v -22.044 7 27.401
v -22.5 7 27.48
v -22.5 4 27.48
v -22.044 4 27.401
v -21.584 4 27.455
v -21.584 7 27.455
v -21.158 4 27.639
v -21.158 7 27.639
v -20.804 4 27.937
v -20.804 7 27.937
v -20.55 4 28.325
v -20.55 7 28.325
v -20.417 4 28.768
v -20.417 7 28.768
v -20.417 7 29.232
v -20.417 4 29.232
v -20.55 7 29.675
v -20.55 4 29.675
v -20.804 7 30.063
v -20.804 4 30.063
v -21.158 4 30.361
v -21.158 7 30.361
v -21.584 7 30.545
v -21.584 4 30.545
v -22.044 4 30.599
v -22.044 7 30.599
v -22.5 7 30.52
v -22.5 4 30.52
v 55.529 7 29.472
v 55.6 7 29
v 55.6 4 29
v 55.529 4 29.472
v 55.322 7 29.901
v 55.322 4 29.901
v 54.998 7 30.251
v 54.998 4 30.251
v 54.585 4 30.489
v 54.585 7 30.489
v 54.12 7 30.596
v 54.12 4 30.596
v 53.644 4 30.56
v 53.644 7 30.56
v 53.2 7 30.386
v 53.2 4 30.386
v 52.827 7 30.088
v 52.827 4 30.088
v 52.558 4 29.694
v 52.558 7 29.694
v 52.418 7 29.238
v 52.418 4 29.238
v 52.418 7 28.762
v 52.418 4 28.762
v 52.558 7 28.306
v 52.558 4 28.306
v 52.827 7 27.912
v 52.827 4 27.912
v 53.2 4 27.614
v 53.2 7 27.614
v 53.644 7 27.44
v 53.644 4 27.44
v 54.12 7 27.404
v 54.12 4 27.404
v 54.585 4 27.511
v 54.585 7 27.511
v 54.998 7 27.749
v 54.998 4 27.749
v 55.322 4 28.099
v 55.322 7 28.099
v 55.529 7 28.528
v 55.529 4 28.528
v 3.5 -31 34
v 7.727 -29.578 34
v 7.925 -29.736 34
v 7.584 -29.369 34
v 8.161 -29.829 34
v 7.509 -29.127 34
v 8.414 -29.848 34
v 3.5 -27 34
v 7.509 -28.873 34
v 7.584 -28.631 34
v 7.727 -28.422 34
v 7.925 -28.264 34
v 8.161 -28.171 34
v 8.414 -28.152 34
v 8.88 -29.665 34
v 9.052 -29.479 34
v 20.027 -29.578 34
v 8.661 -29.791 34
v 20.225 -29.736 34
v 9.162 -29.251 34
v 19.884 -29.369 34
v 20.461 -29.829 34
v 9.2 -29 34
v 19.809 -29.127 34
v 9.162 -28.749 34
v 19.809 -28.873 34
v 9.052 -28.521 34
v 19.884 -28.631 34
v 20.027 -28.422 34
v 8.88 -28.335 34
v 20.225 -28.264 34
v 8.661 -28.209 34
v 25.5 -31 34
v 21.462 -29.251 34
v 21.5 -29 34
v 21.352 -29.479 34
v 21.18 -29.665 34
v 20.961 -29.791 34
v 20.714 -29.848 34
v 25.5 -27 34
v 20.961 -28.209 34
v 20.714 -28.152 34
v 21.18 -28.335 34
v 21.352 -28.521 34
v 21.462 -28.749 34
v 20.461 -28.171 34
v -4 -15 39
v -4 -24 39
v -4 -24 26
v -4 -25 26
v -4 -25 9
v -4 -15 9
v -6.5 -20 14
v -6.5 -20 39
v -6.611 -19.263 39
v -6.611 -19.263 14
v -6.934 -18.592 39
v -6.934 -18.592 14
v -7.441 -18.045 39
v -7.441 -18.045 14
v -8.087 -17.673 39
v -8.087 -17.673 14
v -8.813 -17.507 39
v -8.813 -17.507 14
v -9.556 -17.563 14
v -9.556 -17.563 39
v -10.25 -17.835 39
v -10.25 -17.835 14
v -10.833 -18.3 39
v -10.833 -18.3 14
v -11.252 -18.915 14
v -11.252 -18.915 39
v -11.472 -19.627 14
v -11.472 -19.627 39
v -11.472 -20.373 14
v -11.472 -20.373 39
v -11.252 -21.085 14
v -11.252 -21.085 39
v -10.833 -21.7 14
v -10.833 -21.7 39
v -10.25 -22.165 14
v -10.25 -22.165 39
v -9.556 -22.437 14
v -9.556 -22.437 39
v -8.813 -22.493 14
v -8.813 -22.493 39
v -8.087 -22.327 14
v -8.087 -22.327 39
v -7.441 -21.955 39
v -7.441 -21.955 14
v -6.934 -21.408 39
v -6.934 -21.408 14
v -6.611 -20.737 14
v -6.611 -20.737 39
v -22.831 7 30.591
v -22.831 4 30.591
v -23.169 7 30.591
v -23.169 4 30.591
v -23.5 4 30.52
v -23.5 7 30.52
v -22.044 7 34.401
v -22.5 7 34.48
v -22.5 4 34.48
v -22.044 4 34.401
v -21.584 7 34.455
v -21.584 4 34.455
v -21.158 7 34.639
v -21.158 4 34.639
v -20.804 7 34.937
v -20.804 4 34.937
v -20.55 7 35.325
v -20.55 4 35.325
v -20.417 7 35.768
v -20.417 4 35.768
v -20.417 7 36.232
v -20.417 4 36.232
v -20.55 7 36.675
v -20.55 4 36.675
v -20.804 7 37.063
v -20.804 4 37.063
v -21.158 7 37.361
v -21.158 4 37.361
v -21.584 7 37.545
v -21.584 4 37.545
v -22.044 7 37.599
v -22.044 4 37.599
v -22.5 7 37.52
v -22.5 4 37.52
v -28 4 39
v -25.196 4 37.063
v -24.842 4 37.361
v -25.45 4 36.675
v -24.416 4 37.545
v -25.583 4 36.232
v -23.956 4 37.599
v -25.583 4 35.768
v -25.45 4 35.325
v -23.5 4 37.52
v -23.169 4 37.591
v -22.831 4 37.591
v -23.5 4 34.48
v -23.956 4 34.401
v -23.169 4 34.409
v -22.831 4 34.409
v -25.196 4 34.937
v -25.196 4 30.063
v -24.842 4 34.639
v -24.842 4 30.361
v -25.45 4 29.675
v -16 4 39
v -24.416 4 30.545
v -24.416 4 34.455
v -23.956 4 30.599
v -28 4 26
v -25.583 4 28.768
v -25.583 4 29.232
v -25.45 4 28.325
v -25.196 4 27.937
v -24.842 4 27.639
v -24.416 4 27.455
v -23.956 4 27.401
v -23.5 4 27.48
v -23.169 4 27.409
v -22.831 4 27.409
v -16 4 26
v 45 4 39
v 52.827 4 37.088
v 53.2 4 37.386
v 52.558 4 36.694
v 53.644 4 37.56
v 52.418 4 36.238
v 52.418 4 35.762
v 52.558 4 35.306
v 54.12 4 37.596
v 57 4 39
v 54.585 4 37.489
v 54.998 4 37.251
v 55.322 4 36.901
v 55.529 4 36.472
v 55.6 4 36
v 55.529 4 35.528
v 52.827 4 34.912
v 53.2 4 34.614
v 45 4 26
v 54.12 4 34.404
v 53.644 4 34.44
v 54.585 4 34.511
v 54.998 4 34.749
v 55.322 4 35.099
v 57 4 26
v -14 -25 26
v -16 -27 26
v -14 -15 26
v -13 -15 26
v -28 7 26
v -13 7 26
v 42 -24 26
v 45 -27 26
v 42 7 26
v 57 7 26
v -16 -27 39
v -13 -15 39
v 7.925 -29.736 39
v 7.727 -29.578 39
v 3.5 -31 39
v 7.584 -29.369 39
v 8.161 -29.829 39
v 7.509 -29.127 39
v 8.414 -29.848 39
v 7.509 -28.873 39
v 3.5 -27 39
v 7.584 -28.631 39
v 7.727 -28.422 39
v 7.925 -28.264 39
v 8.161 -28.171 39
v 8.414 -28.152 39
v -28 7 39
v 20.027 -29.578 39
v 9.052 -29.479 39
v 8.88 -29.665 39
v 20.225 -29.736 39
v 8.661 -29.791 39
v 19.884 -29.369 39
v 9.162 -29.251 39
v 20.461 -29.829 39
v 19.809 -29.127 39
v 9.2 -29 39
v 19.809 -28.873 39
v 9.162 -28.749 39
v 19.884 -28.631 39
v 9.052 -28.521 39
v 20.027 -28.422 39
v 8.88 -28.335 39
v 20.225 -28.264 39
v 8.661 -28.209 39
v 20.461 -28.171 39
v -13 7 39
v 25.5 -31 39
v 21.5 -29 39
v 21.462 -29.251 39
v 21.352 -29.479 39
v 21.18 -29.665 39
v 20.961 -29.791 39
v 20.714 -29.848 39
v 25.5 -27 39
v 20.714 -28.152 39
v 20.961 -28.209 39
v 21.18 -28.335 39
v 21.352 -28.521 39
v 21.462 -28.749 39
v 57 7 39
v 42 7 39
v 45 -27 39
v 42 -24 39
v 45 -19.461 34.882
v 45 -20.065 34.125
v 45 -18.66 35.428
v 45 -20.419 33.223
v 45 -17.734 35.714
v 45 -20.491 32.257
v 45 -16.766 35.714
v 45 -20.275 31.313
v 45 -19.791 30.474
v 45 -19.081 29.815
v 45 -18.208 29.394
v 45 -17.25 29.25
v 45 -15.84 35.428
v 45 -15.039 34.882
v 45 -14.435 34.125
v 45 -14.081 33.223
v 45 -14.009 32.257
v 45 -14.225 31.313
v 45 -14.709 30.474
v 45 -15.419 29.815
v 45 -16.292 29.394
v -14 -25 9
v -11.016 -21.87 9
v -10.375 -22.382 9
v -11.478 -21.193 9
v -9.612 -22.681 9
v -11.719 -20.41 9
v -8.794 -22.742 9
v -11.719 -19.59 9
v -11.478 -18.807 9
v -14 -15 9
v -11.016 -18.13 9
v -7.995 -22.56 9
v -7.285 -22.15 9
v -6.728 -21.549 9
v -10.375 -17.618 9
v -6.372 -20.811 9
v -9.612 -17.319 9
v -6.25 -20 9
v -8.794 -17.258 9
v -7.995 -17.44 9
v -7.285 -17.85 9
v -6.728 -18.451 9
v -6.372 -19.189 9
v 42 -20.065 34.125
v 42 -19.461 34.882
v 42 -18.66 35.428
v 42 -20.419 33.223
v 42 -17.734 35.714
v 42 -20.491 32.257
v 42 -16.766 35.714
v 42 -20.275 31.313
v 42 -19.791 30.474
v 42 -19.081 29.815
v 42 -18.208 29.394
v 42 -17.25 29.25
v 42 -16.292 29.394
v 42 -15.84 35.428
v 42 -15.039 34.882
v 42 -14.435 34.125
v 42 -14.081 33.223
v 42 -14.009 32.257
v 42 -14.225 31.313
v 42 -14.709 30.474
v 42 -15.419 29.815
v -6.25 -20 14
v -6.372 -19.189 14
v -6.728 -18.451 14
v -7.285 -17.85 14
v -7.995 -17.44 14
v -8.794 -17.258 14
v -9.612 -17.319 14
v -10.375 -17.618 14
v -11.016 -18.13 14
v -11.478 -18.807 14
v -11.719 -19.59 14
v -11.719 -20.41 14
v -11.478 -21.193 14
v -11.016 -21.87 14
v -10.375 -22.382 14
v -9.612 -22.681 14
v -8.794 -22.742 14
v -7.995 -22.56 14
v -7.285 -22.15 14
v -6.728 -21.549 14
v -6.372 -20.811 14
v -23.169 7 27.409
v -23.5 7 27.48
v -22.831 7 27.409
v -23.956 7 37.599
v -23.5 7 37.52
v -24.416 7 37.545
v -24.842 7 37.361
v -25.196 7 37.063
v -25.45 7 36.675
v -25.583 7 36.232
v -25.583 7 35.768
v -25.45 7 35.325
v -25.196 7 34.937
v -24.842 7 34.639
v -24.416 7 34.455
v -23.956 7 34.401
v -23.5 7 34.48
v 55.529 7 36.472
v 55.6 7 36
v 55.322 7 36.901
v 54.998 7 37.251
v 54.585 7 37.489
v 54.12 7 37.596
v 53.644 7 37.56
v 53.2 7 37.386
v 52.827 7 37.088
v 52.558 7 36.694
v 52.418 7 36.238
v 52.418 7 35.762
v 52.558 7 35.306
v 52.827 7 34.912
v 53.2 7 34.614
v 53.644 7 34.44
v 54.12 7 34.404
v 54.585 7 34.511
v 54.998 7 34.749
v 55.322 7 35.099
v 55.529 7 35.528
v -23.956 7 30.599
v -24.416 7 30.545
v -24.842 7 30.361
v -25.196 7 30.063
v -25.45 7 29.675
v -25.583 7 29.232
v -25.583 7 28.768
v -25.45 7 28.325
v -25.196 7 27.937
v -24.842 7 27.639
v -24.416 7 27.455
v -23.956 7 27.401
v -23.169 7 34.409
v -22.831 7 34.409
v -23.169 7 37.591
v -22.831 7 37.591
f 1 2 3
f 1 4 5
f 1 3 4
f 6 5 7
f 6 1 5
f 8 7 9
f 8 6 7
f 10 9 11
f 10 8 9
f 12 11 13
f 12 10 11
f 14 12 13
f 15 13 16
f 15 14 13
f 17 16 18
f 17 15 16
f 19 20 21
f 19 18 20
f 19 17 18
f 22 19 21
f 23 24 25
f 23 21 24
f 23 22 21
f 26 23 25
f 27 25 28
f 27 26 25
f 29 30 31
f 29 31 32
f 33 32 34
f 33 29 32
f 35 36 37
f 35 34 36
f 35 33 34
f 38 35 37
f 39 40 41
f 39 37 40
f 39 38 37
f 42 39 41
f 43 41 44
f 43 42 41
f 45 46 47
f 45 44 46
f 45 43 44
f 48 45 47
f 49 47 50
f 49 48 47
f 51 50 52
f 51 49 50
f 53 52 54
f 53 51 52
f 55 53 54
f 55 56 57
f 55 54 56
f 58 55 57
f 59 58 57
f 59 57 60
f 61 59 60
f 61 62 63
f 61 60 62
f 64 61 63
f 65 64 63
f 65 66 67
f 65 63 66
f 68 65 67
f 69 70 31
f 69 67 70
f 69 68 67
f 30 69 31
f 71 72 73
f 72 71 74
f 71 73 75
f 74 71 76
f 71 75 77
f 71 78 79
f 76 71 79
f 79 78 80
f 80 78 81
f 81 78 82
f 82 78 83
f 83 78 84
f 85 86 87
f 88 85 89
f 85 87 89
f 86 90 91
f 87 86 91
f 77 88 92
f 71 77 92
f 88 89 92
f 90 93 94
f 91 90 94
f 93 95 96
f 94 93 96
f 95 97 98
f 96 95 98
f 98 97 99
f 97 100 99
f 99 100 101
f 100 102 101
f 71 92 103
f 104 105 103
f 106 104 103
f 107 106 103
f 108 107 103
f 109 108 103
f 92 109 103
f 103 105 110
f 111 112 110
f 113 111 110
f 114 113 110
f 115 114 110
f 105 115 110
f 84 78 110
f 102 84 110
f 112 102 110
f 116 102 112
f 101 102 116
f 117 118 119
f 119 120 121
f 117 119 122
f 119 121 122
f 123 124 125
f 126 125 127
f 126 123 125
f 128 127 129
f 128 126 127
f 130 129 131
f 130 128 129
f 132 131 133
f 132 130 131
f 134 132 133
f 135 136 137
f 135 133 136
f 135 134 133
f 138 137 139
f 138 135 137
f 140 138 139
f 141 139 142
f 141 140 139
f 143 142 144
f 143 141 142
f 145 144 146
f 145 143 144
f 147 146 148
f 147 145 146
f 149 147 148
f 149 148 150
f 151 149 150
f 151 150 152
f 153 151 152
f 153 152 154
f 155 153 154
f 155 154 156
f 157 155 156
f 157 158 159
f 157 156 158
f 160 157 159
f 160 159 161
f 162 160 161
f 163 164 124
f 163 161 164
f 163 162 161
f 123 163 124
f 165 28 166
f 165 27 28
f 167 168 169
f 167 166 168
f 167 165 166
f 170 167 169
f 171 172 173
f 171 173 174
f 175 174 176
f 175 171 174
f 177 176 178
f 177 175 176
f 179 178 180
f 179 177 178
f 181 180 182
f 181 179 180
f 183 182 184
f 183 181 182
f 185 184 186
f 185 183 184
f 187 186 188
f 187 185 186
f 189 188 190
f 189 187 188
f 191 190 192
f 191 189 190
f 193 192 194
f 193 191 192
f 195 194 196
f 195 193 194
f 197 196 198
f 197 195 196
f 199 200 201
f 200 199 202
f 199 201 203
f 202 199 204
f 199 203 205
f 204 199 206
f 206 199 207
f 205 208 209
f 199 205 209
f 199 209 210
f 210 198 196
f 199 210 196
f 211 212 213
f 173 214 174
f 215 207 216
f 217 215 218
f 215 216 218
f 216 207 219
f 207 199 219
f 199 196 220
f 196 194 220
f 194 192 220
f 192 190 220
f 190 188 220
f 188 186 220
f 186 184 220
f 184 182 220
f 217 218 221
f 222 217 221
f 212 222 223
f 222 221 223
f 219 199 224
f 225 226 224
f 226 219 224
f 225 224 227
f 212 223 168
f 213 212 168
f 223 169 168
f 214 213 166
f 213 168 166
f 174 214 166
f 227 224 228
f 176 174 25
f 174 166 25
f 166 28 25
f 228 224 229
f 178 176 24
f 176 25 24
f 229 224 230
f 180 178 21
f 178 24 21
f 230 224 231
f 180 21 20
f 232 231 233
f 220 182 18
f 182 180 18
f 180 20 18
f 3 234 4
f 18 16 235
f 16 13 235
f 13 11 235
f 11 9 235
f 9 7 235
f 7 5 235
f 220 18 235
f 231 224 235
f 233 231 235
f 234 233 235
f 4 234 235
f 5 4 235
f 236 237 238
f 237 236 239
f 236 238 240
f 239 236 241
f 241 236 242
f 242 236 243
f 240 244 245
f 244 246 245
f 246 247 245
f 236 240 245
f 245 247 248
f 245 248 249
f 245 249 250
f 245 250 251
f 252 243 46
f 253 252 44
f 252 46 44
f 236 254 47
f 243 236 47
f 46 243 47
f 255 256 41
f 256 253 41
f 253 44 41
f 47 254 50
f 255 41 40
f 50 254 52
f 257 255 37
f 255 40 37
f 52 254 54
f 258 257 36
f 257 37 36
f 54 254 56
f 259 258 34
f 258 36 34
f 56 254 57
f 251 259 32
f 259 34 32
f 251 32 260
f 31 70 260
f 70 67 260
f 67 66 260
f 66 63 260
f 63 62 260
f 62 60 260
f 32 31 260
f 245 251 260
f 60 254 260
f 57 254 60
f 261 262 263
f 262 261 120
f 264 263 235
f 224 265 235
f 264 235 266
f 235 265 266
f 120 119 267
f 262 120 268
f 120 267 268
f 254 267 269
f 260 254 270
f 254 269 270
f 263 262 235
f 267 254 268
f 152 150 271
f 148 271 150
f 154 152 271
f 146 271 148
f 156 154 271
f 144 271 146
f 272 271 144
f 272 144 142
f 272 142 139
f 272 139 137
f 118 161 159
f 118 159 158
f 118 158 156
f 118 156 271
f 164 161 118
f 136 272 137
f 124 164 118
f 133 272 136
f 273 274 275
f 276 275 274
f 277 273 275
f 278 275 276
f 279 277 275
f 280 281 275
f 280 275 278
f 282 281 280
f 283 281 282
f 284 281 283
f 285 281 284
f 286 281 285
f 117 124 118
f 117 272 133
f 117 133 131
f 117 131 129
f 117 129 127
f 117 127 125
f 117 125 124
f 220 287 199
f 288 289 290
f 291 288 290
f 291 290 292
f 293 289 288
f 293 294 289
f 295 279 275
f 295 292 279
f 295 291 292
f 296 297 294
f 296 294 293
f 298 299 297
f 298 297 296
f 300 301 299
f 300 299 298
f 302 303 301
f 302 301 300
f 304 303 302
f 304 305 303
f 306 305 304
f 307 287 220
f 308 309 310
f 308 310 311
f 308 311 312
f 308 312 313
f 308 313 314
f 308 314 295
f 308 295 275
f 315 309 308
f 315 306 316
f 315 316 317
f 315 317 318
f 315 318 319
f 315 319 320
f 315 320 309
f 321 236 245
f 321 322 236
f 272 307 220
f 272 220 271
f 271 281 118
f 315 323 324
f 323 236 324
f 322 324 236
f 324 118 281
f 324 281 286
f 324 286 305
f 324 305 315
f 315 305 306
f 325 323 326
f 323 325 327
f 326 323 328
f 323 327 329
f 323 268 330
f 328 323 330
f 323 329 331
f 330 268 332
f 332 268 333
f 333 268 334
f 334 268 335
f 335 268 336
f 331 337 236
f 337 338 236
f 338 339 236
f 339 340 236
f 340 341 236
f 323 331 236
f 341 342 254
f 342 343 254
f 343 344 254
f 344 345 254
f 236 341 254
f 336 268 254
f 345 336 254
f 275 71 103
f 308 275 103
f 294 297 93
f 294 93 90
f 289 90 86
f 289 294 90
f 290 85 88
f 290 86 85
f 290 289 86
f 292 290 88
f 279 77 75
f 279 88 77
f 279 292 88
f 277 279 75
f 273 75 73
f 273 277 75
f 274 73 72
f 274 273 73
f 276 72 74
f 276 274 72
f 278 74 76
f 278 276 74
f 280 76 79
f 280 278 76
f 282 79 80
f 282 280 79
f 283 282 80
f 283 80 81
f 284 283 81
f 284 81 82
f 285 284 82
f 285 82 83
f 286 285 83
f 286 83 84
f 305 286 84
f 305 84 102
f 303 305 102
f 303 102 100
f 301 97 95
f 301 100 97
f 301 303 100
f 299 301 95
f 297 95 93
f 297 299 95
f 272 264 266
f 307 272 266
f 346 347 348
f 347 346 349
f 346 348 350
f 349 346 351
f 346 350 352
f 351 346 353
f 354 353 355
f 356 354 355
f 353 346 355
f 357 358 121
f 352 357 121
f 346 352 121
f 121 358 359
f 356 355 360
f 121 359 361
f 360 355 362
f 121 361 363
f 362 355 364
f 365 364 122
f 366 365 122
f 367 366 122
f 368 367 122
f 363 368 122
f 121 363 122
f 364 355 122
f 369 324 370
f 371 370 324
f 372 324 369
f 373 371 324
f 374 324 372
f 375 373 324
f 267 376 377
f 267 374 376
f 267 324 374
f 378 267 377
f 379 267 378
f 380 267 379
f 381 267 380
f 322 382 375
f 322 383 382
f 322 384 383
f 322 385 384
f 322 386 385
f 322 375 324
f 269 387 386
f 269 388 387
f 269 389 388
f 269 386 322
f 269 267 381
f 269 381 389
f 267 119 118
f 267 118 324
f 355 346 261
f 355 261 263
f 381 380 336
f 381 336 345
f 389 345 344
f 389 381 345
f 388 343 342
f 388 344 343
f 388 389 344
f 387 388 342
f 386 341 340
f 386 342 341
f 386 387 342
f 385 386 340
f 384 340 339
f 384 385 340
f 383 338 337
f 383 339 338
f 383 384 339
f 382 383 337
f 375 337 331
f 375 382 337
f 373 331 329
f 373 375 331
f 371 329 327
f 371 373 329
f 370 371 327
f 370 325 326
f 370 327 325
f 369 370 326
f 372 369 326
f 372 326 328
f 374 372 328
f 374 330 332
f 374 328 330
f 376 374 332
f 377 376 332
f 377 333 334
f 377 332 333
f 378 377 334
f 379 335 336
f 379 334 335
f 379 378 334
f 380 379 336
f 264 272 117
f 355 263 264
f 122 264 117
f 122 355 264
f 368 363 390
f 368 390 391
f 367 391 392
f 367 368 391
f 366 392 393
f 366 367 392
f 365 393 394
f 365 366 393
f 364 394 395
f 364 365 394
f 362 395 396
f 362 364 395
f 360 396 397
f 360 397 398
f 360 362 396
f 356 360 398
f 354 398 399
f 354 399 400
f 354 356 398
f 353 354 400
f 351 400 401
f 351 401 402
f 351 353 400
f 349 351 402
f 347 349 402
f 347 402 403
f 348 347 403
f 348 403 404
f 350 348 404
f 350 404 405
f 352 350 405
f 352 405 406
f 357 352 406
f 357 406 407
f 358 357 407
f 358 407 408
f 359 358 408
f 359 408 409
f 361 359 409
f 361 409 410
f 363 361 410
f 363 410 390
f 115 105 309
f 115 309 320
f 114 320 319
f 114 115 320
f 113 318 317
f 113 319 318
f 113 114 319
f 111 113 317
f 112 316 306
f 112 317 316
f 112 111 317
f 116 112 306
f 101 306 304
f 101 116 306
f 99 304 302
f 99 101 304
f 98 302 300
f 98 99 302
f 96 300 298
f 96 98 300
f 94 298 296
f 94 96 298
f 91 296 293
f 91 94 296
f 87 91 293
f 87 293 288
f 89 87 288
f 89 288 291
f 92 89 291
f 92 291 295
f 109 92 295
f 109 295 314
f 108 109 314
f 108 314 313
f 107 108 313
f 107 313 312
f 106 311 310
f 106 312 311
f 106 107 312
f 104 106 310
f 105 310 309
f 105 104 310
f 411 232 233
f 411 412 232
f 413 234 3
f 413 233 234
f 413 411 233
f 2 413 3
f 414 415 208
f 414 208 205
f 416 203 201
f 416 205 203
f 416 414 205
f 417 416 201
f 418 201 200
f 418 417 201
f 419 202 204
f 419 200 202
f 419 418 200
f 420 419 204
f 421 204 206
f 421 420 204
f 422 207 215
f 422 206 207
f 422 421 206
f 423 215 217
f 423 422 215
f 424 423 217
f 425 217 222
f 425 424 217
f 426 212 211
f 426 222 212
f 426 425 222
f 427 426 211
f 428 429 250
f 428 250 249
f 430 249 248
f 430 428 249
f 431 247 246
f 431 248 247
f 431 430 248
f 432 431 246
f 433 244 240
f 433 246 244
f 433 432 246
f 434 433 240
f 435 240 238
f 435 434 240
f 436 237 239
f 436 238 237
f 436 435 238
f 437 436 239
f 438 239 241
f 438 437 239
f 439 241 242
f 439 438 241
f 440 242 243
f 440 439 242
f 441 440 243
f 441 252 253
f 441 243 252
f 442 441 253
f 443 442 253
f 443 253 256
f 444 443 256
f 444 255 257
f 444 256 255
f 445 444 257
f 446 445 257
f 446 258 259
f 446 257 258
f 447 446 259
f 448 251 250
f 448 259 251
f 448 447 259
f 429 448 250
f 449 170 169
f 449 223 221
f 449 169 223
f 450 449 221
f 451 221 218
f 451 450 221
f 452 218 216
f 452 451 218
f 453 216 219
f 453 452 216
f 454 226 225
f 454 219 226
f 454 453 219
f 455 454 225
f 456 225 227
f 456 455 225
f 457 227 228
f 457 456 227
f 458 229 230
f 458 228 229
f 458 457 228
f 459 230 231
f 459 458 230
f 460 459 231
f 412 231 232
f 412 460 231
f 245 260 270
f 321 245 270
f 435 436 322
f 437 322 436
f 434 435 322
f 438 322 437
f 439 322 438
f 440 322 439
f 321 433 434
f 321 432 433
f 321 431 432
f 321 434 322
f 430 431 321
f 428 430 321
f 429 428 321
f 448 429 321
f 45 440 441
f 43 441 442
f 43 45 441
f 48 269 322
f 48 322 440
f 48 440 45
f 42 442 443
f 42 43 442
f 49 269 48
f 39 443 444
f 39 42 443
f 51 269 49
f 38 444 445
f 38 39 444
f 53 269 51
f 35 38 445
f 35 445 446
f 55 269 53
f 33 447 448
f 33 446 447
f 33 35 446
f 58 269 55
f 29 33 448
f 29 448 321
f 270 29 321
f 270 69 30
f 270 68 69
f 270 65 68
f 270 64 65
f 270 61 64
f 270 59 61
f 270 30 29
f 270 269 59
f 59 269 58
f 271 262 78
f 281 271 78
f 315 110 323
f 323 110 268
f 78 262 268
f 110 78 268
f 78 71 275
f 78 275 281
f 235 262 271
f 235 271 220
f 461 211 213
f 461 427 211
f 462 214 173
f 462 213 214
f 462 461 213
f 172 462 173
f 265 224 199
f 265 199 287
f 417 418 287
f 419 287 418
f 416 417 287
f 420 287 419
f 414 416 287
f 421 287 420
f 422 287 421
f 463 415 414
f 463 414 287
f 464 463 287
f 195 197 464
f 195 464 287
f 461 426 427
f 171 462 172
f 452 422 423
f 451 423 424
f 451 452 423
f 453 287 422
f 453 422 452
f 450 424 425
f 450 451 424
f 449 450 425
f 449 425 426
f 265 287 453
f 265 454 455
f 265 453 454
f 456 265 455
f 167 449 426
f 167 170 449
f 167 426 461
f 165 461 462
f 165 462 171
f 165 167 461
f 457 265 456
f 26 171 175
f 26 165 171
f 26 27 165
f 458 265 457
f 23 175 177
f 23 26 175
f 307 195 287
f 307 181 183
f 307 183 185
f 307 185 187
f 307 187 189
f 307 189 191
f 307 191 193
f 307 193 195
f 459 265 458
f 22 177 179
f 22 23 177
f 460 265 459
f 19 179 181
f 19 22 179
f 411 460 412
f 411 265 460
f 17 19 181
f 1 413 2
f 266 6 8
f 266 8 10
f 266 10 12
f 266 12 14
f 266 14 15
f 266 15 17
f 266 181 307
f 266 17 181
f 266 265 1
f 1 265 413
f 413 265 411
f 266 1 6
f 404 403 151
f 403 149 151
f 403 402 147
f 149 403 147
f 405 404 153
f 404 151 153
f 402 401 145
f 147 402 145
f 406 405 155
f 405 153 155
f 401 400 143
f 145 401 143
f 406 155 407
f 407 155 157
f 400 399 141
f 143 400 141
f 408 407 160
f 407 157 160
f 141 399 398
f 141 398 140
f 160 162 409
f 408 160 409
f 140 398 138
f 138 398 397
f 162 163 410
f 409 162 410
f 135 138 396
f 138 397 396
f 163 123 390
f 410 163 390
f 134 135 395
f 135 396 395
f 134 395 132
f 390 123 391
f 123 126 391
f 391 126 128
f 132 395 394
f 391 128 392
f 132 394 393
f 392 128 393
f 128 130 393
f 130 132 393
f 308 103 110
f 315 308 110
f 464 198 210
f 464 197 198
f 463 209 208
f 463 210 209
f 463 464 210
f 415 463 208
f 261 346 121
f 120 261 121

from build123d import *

# Parameters (mm, degrees)
CYLINDER076_R           = 2.5
CYLINDER076_DEPTH       = 27
CYLINDER075_R           = 2.75
CYLINDER075_DEPTH       = 10
BOX033_W                = 10
BOX033_H                = 10
BOX033_DEPTH            = 30
CYLINDER051_R           = 1.6
CYLINDER051_DEPTH       = 28
CYLINDER051_ROLL_ANGLE  = 90
CYLINDER050_R           = 1.6
CYLINDER050_DEPTH       = 28
CYLINDER050_ROLL_ANGLE  = 90
CYLINDER049_R           = 1.6
CYLINDER049_DEPTH       = 28
CYLINDER049_ROLL_ANGLE  = 90
CYLINDER048_R           = 1.6
CYLINDER048_DEPTH       = 28
CYLINDER048_ROLL_ANGLE  = 90
CYLINDER044_R           = 1.6
CYLINDER044_DEPTH       = 28
CYLINDER044_ROLL_ANGLE  = 90
CYLINDER043_R           = 1.6
CYLINDER043_DEPTH       = 28
CYLINDER043_ROLL_ANGLE  = 90
CYLINDER042_R           = 1.6
CYLINDER042_DEPTH       = 28
CYLINDER042_ROLL_ANGLE  = 90
CYLINDER041_R           = 1.6
CYLINDER041_DEPTH       = 28
CYLINDER041_ROLL_ANGLE  = 90
CYLINDER047_R           = 0.85
CYLINDER047_DEPTH       = 10
CYLINDER046_R           = 0.85
CYLINDER046_DEPTH       = 10
BOX025_W                = 22
BOX025_H                = 4
BOX025_DEPTH            = 5
CYLINDER045_R           = 3.25
CYLINDER045_DEPTH       = 10
CYLINDER045_PITCH_ANGLE = 90
BOX024_W                = 55
BOX024_H                = 31
BOX024_DEPTH            = 13
BOX021_W                = 61
BOX021_H                = 34
BOX021_DEPTH            = 13
BOX023_W                = 12
BOX023_H                = 3
BOX023_DEPTH            = 13
BOX022_W                = 12
BOX022_H                = 3
BOX022_DEPTH            = 13


with BuildPart() as cylinder128:
    # Cylinder076 → Cylinder076 (new body)
    with BuildSketch(Plane(origin=(-9, -20, 14), x_dir=(1, 0, 0), z_dir=(0, 0, 1))):
        Circle(CYLINDER076_R)
    extrude(amount=CYLINDER076_DEPTH)


with BuildPart() as phototransistor_hole:
    # Cylinder075 → Cylinder075 (new body)
    with BuildSketch(Plane(origin=(-9, -20, 4), x_dir=(1, 0, 0), z_dir=(0, 0, 1))):
        Circle(CYLINDER075_R)
    extrude(amount=CYLINDER075_DEPTH)

    # Fusion103: union Cylinder128
    add(cylinder128.part)


with BuildPart() as cut045021:
    # Box033 → Box033 (new body)
    with BuildSketch(Plane(origin=(-14, -25, 9), x_dir=(1, 0, 0), z_dir=(0, 0, 1))):
        with Locations((5, 5)):
            Rectangle(BOX033_W, BOX033_H)
    extrude(amount=BOX033_DEPTH)

    # Cut045021: cut phototransistor hole
    add(phototransistor_hole.part, mode=Mode.SUBTRACT)


with BuildPart() as cylinder103:
    # Cylinder051 → Cylinder051 (new body)
    with BuildSketch(Plane.XY):
        Circle(CYLINDER051_R)
    extrude(amount=CYLINDER051_DEPTH)


with BuildPart() as cylinder103_1:
    # Cylinder051 roll: moved
    add(cylinder103.part.rotate(Axis((0, 0, 0), (1, 0, 0)), CYLINDER051_ROLL_ANGLE))


with BuildPart() as cylinder103_2:
    # Cylinder051 placement: moved
    add(cylinder103_1.part.moved(Location((-23, 20, 36))))


with BuildPart() as fusion085:
    # Cylinder050 → Cylinder050 (new body)
    with BuildSketch(Plane.XY):
        Circle(CYLINDER050_R)
    extrude(amount=CYLINDER050_DEPTH)


with BuildPart() as fusion085_1:
    # Cylinder050 roll: moved
    add(fusion085.part.rotate(Axis((0, 0, 0), (1, 0, 0)), CYLINDER050_ROLL_ANGLE))


with BuildPart() as fusion085_2:
    # Cylinder050 placement: moved
    add(fusion085_1.part.moved(Location((-23, 20, 29))))

    # Fusion085: union Cylinder103
    add(cylinder103_2.part)


with BuildPart() as fusion085_3:
    # Fusion085 placement: moved
    add(fusion085_2.part.moved(Location((-1, 0, 0))))


with BuildPart() as cylinder101:
    # Cylinder049 → Cylinder049 (new body)
    with BuildSketch(Plane.XY):
        Circle(CYLINDER049_R)
    extrude(amount=CYLINDER049_DEPTH)


with BuildPart() as cylinder101_1:
    # Cylinder049 roll: moved
    add(cylinder101.part.rotate(Axis((0, 0, 0), (1, 0, 0)), CYLINDER049_ROLL_ANGLE))


with BuildPart() as cylinder101_2:
    # Cylinder049 placement: moved
    add(cylinder101_1.part.moved(Location((-23, 20, 36))))


with BuildPart() as fusion084:
    # Cylinder048 → Cylinder048 (new body)
    with BuildSketch(Plane.XY):
        Circle(CYLINDER048_R)
    extrude(amount=CYLINDER048_DEPTH)


with BuildPart() as fusion084_1:
    # Cylinder048 roll: moved
    add(fusion084.part.rotate(Axis((0, 0, 0), (1, 0, 0)), CYLINDER048_ROLL_ANGLE))


with BuildPart() as fusion084_2:
    # Cylinder048 placement: moved
    add(fusion084_1.part.moved(Location((-23, 20, 29))))

    # Fusion084: union Cylinder101
    add(cylinder101_2.part)


with BuildPart() as fusion084_3:
    # Fusion084 placement: moved
    add(fusion084_2.part.moved(Location((1, 0, 0))))


with BuildPart() as cylinder096:
    # Cylinder044 → Cylinder044 (new body)
    with BuildSketch(Plane.XY):
        Circle(CYLINDER044_R)
    extrude(amount=CYLINDER044_DEPTH)


with BuildPart() as cylinder096_1:
    # Cylinder044 roll: moved
    add(cylinder096.part.rotate(Axis((0, 0, 0), (1, 0, 0)), CYLINDER044_ROLL_ANGLE))


with BuildPart() as cylinder096_2:
    # Cylinder044 placement: moved
    add(cylinder096_1.part.moved(Location((-23, 20, 36))))


with BuildPart() as fusion080:
    # Cylinder043 → Cylinder043 (new body)
    with BuildSketch(Plane.XY):
        Circle(CYLINDER043_R)
    extrude(amount=CYLINDER043_DEPTH)


with BuildPart() as fusion080_1:
    # Cylinder043 roll: moved
    add(fusion080.part.rotate(Axis((0, 0, 0), (1, 0, 0)), CYLINDER043_ROLL_ANGLE))


with BuildPart() as fusion080_2:
    # Cylinder043 placement: moved
    add(fusion080_1.part.moved(Location((-23, 20, 29))))

    # Fusion080: union Cylinder096
    add(cylinder096_2.part)


with BuildPart() as cylinder094:
    # Cylinder042 → Cylinder042 (new body)
    with BuildSketch(Plane.XY):
        Circle(CYLINDER042_R)
    extrude(amount=CYLINDER042_DEPTH)


with BuildPart() as cylinder094_1:
    # Cylinder042 roll: moved
    add(cylinder094.part.rotate(Axis((0, 0, 0), (1, 0, 0)), CYLINDER042_ROLL_ANGLE))


with BuildPart() as cylinder094_2:
    # Cylinder042 placement: moved
    add(cylinder094_1.part.moved(Location((54, 20, 36))))


with BuildPart() as fusion081:
    # Cylinder041 → Cylinder041 (new body)
    with BuildSketch(Plane.XY):
        Circle(CYLINDER041_R)
    extrude(amount=CYLINDER041_DEPTH)


with BuildPart() as fusion081_1:
    # Cylinder041 roll: moved
    add(fusion081.part.rotate(Axis((0, 0, 0), (1, 0, 0)), CYLINDER041_ROLL_ANGLE))


with BuildPart() as fusion081_2:
    # Cylinder041 placement: moved
    add(fusion081_1.part.moved(Location((54, 20, 29))))

    # Fusion081: union Cylinder094
    add(cylinder094_2.part)


with BuildPart() as cylinder099:
    # Cylinder047 → Cylinder047 (new body)
    with BuildSketch(Plane(origin=(8.35, -29, 40), x_dir=(1, 0, 0), z_dir=(0, 0, -1))):
        Circle(CYLINDER047_R)
    extrude(amount=CYLINDER047_DEPTH)


with BuildPart() as fusion078:
    # Cylinder046 → Cylinder046 (new body)
    with BuildSketch(Plane(origin=(20.65, -29, 30), x_dir=(1, 0, 0), z_dir=(0, 0, 1))):
        Circle(CYLINDER046_R)
    extrude(amount=CYLINDER046_DEPTH)

    # Fusion078: union Cylinder099
    add(cylinder099.part)


with BuildPart() as cut039:
    # Box025 → Box025 (new body)
    with BuildSketch(Plane(origin=(3.5, -31, 34), x_dir=(1, 0, 0), z_dir=(0, 0, 1))):
        with Locations((11, 2)):
            Rectangle(BOX025_W, BOX025_H)
    extrude(amount=BOX025_DEPTH)

    # Cut039: cut Fusion078
    add(fusion078.part, mode=Mode.SUBTRACT)


with BuildPart() as cylinder097:
    # Cylinder045 → Cylinder045 (new body)
    with BuildSketch(Plane.XY):
        Circle(CYLINDER045_R)
    extrude(amount=CYLINDER045_DEPTH)


with BuildPart() as cylinder097_1:
    # Cylinder045 pitch: moved
    add(cylinder097.part.rotate(Axis((0, 0, 0), (0, 1, 0)), CYLINDER045_PITCH_ANGLE))


with BuildPart() as cylinder097_2:
    # Cylinder045 placement: moved
    add(cylinder097_1.part.moved(Location((36, -17.25, 32.5))))


with BuildPart() as cube023:
    # Box024 → Box024 (new body)
    with BuildSketch(Plane(origin=(-13, -24, 26), x_dir=(1, 0, 0), z_dir=(0, 0, 1))):
        with Locations((27.5, 15.5)):
            Rectangle(BOX024_W, BOX024_H)
    extrude(amount=BOX024_DEPTH)


with BuildPart() as fusion079:
    # Box021 → Box021 (new body)
    with BuildSketch(Plane(origin=(-16, -27, 26), x_dir=(1, 0, 0), z_dir=(0, 0, 1))):
        with Locations((30.5, 17)):
            Rectangle(BOX021_W, BOX021_H)
    extrude(amount=BOX021_DEPTH)

    # Cut037: cut Cube023
    add(cube023.part, mode=Mode.SUBTRACT)

    # Cut038: cut Cylinder097
    add(cylinder097_2.part, mode=Mode.SUBTRACT)

    # Fusion079: union Cut039
    add(cut039.part)


with BuildPart() as fusion082:
    # Box023 → Box023 (new body)
    with BuildSketch(Plane(origin=(-28, 4, 26), x_dir=(1, 0, 0), z_dir=(0, 0, 1))):
        with Locations((6, 1.5)):
            Rectangle(BOX023_W, BOX023_H)
    extrude(amount=BOX023_DEPTH)

    # Fusion082: union Fusion079
    add(fusion079.part)


with BuildPart() as switch_mount_with_phototransistor_hole:
    # Box022 → Box022 (new body)
    with BuildSketch(Plane(origin=(45, 4, 26), x_dir=(1, 0, 0), z_dir=(0, 0, 1))):
        with Locations((6, 1.5)):
            Rectangle(BOX022_W, BOX022_H)
    extrude(amount=BOX022_DEPTH)

    # Fusion083: union Fusion082
    add(fusion082.part)

    # Cut040: cut Fusion081
    add(fusion081_2.part, mode=Mode.SUBTRACT)

    # Cut041: cut Fusion080
    add(fusion080_2.part, mode=Mode.SUBTRACT)

    # Cut042: cut Fusion084
    add(fusion084_3.part, mode=Mode.SUBTRACT)

    # Cut043: cut Fusion085
    add(fusion085_3.part, mode=Mode.SUBTRACT)

    # Fusion104: union Cut045021
    add(cut045021.part)


solid = switch_mount_with_phototransistor_hole.part
